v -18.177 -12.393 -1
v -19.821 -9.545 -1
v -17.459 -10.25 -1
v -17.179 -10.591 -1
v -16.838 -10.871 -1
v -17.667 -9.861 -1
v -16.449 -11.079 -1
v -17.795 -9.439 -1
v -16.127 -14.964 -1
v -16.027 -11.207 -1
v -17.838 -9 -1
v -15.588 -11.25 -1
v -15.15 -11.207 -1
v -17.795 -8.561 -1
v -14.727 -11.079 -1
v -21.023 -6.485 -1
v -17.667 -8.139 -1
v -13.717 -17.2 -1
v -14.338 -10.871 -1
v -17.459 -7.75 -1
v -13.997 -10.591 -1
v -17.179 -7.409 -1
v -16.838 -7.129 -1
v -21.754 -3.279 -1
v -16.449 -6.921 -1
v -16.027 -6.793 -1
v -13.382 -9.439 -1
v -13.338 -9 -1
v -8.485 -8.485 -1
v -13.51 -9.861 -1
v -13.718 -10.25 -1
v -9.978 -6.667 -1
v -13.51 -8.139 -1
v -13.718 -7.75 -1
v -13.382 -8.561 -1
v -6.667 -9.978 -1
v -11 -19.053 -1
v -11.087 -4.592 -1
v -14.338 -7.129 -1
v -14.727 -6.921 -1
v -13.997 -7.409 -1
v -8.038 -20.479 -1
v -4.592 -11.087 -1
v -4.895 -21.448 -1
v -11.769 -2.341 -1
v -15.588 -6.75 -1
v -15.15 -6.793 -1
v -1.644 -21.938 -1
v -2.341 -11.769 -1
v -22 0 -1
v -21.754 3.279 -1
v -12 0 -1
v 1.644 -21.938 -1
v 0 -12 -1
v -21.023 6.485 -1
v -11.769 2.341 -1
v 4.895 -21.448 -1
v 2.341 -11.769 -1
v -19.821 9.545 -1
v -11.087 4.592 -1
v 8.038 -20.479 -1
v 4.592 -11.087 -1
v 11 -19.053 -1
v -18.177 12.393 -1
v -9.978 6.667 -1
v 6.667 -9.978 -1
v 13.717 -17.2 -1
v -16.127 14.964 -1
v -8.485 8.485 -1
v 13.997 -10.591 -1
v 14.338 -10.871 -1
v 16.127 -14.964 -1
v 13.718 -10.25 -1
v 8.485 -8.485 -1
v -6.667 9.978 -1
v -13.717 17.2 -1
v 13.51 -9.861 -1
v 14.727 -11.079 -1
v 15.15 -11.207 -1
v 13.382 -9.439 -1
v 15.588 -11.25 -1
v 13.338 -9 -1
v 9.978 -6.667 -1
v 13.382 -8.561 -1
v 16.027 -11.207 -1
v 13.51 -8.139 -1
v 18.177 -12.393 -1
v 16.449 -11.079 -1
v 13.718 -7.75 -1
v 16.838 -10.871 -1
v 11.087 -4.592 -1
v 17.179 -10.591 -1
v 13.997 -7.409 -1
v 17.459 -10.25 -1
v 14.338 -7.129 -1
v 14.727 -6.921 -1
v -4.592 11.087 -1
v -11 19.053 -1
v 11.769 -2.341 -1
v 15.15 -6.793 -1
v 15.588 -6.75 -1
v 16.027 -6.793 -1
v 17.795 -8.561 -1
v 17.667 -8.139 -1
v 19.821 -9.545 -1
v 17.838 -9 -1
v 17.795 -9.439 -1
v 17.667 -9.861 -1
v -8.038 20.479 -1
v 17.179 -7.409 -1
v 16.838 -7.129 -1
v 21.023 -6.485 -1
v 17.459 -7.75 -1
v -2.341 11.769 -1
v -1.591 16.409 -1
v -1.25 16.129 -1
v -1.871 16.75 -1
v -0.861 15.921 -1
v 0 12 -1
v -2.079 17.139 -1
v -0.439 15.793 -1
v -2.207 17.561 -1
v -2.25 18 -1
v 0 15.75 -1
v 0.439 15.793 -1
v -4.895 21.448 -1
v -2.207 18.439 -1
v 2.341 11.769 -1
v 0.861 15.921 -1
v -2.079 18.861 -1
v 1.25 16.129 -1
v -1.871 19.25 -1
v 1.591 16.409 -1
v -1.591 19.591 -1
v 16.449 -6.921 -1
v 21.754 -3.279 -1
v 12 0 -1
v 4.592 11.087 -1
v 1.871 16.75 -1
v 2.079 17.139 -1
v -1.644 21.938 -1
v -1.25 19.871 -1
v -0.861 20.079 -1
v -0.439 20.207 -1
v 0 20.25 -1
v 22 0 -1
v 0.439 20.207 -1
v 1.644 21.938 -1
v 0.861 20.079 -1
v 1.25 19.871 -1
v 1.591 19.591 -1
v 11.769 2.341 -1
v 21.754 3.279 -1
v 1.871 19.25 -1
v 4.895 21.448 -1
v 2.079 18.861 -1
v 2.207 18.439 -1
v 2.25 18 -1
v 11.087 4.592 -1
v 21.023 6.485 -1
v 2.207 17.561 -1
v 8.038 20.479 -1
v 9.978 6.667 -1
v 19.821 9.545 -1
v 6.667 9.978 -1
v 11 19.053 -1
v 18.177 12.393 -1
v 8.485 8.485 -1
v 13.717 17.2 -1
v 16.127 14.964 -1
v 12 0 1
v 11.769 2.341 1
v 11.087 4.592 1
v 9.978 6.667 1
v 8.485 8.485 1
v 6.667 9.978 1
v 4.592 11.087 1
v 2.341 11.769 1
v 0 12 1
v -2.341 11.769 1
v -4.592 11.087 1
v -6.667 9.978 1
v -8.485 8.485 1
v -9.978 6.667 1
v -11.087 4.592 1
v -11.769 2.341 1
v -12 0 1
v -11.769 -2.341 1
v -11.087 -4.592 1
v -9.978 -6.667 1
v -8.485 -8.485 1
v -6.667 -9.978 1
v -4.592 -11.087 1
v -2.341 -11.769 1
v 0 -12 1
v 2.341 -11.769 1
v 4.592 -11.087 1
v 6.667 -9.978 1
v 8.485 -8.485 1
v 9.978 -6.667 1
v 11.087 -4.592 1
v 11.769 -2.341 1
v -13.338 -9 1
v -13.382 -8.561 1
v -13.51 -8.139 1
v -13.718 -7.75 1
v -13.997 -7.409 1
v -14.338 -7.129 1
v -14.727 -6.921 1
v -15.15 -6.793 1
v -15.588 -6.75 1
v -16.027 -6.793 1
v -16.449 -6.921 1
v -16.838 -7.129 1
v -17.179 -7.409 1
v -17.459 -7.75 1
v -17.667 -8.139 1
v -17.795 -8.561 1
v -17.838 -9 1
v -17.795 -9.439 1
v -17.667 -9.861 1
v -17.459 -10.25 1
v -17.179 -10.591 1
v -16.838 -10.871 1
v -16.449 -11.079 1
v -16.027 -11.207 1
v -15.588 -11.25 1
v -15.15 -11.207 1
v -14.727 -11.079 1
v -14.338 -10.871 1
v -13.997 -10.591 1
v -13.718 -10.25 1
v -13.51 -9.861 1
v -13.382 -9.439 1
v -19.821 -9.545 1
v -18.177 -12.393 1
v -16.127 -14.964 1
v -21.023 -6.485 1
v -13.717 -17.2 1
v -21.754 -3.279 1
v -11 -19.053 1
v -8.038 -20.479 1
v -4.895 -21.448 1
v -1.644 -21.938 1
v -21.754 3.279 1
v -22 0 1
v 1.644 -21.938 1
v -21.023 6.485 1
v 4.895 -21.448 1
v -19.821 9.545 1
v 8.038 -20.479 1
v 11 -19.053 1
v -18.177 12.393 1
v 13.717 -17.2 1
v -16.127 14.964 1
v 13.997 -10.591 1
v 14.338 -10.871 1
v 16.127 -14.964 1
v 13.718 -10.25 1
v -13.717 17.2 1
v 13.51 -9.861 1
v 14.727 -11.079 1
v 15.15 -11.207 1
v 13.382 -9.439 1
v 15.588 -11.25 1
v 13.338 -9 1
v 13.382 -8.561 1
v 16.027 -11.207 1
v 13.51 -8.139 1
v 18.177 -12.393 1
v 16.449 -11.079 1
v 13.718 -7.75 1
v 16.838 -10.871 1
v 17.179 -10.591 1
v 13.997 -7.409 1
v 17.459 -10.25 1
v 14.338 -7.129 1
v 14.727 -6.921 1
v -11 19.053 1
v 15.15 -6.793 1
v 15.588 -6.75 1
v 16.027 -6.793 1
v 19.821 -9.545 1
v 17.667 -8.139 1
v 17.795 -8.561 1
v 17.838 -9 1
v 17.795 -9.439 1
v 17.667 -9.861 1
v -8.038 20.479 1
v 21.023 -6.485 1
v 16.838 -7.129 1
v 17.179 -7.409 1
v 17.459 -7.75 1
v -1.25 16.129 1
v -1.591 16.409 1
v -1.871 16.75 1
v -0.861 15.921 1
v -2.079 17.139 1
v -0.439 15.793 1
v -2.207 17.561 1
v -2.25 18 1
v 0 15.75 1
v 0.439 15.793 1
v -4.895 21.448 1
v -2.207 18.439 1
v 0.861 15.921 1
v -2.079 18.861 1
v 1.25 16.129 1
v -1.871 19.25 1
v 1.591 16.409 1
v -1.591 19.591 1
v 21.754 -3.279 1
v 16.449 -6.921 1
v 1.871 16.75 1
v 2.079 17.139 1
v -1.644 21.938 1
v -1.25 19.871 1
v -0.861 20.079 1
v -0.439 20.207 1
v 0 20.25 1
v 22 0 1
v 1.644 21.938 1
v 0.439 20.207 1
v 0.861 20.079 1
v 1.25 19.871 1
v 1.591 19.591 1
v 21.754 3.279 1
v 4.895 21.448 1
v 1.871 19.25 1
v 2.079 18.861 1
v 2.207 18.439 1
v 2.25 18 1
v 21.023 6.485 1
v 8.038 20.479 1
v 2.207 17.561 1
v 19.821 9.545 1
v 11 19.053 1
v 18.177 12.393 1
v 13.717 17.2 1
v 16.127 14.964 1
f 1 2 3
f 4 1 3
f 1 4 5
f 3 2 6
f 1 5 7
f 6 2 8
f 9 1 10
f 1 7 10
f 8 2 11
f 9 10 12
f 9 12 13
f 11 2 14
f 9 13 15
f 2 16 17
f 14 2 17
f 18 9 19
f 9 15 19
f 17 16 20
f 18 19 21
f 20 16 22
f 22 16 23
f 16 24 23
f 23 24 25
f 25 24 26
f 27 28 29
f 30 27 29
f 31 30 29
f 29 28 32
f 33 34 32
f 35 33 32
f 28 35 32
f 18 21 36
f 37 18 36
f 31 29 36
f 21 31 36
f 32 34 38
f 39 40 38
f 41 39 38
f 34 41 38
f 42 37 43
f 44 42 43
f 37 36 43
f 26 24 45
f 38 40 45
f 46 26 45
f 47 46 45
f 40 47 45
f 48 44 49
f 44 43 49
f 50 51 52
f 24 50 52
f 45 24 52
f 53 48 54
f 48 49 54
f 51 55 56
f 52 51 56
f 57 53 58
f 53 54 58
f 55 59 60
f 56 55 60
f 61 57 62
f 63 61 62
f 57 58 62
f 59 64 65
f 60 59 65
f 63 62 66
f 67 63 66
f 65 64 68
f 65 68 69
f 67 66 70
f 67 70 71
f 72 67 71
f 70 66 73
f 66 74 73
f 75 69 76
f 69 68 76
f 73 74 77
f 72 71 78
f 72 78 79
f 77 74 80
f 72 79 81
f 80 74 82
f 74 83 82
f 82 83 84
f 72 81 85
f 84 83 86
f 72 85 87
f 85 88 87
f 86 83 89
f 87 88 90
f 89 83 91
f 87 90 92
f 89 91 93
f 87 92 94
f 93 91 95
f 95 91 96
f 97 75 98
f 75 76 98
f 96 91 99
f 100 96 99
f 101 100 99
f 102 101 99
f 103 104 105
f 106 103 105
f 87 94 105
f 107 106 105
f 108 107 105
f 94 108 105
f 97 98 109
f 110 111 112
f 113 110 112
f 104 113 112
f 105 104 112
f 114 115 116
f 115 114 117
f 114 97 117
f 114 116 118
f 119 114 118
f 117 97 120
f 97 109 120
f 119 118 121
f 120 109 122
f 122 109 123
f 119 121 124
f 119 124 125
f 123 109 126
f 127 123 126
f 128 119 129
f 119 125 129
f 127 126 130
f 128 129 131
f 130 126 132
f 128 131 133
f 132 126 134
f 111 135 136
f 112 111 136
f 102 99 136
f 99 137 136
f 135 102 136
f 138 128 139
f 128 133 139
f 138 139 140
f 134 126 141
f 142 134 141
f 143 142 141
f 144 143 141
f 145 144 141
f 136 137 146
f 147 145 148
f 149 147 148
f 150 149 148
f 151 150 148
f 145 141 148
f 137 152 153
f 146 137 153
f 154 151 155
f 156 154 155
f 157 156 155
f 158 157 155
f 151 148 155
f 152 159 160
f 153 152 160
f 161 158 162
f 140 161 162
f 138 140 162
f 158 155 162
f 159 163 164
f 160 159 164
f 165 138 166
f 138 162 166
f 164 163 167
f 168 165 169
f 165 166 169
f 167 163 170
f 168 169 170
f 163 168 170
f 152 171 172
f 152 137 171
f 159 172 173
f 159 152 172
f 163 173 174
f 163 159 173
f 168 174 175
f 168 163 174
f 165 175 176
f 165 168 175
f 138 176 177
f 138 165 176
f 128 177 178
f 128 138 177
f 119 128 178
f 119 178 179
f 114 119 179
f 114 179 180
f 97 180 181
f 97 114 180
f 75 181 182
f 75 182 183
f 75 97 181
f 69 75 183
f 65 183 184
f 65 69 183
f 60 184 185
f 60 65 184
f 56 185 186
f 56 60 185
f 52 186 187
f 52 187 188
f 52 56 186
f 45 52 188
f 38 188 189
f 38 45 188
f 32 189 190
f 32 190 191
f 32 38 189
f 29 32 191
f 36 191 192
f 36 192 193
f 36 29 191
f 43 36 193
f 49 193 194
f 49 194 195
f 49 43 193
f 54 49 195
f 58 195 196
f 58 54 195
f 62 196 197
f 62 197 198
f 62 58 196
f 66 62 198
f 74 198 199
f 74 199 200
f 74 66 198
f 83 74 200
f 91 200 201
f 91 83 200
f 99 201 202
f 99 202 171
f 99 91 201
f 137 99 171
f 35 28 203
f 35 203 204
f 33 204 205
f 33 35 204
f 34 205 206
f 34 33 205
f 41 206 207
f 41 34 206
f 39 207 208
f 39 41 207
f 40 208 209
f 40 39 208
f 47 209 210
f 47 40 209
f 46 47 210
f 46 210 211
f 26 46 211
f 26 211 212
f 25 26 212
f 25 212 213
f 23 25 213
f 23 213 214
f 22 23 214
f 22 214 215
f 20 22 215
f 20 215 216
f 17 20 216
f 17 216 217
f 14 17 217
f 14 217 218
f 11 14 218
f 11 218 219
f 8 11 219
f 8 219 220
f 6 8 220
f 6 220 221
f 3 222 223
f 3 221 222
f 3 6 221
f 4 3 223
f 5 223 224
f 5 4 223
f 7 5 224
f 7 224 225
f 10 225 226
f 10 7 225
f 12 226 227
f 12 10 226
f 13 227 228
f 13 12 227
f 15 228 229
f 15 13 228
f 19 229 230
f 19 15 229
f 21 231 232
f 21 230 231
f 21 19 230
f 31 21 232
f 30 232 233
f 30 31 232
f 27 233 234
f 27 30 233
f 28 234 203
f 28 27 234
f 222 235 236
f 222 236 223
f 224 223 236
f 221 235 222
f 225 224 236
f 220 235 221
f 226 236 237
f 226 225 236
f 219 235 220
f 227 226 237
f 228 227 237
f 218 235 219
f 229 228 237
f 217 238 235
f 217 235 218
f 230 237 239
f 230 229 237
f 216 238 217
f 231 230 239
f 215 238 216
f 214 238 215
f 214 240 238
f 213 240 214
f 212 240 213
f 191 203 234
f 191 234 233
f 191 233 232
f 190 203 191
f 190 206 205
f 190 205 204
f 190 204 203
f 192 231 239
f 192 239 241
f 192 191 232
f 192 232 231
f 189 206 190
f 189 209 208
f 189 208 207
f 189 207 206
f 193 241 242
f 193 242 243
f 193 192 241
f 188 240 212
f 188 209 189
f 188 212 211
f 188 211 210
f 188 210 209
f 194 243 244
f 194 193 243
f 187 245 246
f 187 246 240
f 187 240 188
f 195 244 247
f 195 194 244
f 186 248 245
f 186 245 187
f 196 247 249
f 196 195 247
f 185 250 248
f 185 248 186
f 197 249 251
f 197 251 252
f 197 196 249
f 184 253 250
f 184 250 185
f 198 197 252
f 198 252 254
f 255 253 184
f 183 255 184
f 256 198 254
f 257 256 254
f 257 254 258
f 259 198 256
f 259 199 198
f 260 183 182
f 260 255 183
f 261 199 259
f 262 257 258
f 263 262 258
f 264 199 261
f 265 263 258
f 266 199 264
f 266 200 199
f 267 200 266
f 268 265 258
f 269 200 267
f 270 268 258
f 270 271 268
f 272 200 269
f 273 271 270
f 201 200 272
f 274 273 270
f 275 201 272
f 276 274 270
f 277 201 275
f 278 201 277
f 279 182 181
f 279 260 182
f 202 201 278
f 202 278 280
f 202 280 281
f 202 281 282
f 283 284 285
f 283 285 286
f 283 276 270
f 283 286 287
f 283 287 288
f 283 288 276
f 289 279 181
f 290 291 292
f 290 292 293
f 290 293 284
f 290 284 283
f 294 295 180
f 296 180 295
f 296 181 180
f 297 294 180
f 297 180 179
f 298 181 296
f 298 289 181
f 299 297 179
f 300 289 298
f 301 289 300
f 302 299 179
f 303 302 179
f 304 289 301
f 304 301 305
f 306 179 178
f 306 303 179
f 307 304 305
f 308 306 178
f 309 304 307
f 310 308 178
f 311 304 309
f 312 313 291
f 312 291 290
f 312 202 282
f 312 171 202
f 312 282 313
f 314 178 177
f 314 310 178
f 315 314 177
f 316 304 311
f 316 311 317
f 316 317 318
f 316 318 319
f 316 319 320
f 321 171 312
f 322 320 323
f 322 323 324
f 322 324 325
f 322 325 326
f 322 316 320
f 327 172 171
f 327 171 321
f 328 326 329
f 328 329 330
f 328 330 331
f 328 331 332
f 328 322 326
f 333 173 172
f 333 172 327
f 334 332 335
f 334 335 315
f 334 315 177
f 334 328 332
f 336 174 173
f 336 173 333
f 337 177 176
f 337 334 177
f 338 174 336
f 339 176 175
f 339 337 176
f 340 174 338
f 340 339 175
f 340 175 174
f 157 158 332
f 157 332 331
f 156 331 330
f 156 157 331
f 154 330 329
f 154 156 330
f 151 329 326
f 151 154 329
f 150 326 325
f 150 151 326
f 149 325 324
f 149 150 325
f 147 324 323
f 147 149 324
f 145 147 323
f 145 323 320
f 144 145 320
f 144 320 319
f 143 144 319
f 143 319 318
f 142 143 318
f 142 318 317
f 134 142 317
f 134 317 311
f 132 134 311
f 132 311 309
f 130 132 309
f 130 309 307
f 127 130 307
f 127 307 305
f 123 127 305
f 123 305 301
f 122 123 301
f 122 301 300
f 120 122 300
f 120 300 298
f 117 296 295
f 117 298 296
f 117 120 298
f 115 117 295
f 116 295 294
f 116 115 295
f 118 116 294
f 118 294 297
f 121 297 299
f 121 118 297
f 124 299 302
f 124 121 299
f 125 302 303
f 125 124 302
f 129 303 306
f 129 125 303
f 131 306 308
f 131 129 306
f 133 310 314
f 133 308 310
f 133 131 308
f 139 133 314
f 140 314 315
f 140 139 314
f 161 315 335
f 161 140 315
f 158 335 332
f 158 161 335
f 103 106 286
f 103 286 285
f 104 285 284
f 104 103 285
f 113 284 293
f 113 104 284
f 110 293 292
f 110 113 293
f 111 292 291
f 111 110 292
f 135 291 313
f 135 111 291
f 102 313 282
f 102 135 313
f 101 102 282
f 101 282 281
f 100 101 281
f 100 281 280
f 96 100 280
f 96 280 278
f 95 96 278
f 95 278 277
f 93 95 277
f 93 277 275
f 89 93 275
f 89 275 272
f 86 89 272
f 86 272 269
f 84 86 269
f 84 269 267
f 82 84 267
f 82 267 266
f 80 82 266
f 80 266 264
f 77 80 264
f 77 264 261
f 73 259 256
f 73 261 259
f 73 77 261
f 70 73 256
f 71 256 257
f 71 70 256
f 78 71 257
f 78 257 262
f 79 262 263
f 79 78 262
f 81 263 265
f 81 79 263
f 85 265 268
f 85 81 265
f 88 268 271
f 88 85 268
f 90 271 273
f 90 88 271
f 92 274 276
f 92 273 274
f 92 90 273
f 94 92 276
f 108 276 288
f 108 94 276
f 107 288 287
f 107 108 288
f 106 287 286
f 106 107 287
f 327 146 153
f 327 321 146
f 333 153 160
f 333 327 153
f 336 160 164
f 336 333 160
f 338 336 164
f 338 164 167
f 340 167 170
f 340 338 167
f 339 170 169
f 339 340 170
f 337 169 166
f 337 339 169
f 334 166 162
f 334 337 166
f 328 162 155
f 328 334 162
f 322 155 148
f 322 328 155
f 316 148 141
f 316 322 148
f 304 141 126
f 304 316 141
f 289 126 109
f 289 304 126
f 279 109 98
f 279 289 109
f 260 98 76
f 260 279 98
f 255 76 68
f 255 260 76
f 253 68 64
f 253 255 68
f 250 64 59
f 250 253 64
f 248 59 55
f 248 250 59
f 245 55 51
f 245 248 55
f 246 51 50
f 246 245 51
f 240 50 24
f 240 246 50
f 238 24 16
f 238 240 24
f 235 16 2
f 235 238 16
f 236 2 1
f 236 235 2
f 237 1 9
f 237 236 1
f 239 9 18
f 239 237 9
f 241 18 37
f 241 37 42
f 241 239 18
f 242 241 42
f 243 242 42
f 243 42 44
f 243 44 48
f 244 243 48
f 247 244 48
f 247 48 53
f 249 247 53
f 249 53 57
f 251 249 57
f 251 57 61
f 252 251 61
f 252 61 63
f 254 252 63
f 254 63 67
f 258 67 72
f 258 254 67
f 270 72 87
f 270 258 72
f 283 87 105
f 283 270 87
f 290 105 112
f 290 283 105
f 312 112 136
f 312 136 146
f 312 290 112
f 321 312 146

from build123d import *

# Parameters (mm, degrees)
SKETCH1_R               = 22
SKETCH1_R_2             = 12
BOSS_EXTRUDE1_DEPTH     = 1
CUT_EXTRUDE1_DEPTH      = 32.176914536
CUT_EXTRUDE1_DEPTH_BACK = 32.176914536
SKETCH2_R               = 2.25


with BuildPart() as part:
    # Sketch1 → Boss-Extrude1 (new, symmetric)
    with BuildSketch(Plane.XY):
        Circle(SKETCH1_R)
        Circle(SKETCH1_R_2, mode=Mode.SUBTRACT)
    extrude(amount=BOSS_EXTRUDE1_DEPTH, both=True)

    # Sketch2 → Cut-Extrude1 (cut, two sides: drawn at the far end of the back side and taken through both)
    with BuildSketch(Plane.XY.offset(1).offset(-CUT_EXTRUDE1_DEPTH_BACK)):
        with Locations((0, 18)):
            Circle(SKETCH2_R)
        with Locations((15.588457268, -9)):
            Circle(SKETCH2_R)
        with Locations((-15.588457268, -9)):
            Circle(SKETCH2_R)
    extrude(amount=CUT_EXTRUDE1_DEPTH + CUT_EXTRUDE1_DEPTH_BACK, mode=Mode.SUBTRACT)


solid = part.part
